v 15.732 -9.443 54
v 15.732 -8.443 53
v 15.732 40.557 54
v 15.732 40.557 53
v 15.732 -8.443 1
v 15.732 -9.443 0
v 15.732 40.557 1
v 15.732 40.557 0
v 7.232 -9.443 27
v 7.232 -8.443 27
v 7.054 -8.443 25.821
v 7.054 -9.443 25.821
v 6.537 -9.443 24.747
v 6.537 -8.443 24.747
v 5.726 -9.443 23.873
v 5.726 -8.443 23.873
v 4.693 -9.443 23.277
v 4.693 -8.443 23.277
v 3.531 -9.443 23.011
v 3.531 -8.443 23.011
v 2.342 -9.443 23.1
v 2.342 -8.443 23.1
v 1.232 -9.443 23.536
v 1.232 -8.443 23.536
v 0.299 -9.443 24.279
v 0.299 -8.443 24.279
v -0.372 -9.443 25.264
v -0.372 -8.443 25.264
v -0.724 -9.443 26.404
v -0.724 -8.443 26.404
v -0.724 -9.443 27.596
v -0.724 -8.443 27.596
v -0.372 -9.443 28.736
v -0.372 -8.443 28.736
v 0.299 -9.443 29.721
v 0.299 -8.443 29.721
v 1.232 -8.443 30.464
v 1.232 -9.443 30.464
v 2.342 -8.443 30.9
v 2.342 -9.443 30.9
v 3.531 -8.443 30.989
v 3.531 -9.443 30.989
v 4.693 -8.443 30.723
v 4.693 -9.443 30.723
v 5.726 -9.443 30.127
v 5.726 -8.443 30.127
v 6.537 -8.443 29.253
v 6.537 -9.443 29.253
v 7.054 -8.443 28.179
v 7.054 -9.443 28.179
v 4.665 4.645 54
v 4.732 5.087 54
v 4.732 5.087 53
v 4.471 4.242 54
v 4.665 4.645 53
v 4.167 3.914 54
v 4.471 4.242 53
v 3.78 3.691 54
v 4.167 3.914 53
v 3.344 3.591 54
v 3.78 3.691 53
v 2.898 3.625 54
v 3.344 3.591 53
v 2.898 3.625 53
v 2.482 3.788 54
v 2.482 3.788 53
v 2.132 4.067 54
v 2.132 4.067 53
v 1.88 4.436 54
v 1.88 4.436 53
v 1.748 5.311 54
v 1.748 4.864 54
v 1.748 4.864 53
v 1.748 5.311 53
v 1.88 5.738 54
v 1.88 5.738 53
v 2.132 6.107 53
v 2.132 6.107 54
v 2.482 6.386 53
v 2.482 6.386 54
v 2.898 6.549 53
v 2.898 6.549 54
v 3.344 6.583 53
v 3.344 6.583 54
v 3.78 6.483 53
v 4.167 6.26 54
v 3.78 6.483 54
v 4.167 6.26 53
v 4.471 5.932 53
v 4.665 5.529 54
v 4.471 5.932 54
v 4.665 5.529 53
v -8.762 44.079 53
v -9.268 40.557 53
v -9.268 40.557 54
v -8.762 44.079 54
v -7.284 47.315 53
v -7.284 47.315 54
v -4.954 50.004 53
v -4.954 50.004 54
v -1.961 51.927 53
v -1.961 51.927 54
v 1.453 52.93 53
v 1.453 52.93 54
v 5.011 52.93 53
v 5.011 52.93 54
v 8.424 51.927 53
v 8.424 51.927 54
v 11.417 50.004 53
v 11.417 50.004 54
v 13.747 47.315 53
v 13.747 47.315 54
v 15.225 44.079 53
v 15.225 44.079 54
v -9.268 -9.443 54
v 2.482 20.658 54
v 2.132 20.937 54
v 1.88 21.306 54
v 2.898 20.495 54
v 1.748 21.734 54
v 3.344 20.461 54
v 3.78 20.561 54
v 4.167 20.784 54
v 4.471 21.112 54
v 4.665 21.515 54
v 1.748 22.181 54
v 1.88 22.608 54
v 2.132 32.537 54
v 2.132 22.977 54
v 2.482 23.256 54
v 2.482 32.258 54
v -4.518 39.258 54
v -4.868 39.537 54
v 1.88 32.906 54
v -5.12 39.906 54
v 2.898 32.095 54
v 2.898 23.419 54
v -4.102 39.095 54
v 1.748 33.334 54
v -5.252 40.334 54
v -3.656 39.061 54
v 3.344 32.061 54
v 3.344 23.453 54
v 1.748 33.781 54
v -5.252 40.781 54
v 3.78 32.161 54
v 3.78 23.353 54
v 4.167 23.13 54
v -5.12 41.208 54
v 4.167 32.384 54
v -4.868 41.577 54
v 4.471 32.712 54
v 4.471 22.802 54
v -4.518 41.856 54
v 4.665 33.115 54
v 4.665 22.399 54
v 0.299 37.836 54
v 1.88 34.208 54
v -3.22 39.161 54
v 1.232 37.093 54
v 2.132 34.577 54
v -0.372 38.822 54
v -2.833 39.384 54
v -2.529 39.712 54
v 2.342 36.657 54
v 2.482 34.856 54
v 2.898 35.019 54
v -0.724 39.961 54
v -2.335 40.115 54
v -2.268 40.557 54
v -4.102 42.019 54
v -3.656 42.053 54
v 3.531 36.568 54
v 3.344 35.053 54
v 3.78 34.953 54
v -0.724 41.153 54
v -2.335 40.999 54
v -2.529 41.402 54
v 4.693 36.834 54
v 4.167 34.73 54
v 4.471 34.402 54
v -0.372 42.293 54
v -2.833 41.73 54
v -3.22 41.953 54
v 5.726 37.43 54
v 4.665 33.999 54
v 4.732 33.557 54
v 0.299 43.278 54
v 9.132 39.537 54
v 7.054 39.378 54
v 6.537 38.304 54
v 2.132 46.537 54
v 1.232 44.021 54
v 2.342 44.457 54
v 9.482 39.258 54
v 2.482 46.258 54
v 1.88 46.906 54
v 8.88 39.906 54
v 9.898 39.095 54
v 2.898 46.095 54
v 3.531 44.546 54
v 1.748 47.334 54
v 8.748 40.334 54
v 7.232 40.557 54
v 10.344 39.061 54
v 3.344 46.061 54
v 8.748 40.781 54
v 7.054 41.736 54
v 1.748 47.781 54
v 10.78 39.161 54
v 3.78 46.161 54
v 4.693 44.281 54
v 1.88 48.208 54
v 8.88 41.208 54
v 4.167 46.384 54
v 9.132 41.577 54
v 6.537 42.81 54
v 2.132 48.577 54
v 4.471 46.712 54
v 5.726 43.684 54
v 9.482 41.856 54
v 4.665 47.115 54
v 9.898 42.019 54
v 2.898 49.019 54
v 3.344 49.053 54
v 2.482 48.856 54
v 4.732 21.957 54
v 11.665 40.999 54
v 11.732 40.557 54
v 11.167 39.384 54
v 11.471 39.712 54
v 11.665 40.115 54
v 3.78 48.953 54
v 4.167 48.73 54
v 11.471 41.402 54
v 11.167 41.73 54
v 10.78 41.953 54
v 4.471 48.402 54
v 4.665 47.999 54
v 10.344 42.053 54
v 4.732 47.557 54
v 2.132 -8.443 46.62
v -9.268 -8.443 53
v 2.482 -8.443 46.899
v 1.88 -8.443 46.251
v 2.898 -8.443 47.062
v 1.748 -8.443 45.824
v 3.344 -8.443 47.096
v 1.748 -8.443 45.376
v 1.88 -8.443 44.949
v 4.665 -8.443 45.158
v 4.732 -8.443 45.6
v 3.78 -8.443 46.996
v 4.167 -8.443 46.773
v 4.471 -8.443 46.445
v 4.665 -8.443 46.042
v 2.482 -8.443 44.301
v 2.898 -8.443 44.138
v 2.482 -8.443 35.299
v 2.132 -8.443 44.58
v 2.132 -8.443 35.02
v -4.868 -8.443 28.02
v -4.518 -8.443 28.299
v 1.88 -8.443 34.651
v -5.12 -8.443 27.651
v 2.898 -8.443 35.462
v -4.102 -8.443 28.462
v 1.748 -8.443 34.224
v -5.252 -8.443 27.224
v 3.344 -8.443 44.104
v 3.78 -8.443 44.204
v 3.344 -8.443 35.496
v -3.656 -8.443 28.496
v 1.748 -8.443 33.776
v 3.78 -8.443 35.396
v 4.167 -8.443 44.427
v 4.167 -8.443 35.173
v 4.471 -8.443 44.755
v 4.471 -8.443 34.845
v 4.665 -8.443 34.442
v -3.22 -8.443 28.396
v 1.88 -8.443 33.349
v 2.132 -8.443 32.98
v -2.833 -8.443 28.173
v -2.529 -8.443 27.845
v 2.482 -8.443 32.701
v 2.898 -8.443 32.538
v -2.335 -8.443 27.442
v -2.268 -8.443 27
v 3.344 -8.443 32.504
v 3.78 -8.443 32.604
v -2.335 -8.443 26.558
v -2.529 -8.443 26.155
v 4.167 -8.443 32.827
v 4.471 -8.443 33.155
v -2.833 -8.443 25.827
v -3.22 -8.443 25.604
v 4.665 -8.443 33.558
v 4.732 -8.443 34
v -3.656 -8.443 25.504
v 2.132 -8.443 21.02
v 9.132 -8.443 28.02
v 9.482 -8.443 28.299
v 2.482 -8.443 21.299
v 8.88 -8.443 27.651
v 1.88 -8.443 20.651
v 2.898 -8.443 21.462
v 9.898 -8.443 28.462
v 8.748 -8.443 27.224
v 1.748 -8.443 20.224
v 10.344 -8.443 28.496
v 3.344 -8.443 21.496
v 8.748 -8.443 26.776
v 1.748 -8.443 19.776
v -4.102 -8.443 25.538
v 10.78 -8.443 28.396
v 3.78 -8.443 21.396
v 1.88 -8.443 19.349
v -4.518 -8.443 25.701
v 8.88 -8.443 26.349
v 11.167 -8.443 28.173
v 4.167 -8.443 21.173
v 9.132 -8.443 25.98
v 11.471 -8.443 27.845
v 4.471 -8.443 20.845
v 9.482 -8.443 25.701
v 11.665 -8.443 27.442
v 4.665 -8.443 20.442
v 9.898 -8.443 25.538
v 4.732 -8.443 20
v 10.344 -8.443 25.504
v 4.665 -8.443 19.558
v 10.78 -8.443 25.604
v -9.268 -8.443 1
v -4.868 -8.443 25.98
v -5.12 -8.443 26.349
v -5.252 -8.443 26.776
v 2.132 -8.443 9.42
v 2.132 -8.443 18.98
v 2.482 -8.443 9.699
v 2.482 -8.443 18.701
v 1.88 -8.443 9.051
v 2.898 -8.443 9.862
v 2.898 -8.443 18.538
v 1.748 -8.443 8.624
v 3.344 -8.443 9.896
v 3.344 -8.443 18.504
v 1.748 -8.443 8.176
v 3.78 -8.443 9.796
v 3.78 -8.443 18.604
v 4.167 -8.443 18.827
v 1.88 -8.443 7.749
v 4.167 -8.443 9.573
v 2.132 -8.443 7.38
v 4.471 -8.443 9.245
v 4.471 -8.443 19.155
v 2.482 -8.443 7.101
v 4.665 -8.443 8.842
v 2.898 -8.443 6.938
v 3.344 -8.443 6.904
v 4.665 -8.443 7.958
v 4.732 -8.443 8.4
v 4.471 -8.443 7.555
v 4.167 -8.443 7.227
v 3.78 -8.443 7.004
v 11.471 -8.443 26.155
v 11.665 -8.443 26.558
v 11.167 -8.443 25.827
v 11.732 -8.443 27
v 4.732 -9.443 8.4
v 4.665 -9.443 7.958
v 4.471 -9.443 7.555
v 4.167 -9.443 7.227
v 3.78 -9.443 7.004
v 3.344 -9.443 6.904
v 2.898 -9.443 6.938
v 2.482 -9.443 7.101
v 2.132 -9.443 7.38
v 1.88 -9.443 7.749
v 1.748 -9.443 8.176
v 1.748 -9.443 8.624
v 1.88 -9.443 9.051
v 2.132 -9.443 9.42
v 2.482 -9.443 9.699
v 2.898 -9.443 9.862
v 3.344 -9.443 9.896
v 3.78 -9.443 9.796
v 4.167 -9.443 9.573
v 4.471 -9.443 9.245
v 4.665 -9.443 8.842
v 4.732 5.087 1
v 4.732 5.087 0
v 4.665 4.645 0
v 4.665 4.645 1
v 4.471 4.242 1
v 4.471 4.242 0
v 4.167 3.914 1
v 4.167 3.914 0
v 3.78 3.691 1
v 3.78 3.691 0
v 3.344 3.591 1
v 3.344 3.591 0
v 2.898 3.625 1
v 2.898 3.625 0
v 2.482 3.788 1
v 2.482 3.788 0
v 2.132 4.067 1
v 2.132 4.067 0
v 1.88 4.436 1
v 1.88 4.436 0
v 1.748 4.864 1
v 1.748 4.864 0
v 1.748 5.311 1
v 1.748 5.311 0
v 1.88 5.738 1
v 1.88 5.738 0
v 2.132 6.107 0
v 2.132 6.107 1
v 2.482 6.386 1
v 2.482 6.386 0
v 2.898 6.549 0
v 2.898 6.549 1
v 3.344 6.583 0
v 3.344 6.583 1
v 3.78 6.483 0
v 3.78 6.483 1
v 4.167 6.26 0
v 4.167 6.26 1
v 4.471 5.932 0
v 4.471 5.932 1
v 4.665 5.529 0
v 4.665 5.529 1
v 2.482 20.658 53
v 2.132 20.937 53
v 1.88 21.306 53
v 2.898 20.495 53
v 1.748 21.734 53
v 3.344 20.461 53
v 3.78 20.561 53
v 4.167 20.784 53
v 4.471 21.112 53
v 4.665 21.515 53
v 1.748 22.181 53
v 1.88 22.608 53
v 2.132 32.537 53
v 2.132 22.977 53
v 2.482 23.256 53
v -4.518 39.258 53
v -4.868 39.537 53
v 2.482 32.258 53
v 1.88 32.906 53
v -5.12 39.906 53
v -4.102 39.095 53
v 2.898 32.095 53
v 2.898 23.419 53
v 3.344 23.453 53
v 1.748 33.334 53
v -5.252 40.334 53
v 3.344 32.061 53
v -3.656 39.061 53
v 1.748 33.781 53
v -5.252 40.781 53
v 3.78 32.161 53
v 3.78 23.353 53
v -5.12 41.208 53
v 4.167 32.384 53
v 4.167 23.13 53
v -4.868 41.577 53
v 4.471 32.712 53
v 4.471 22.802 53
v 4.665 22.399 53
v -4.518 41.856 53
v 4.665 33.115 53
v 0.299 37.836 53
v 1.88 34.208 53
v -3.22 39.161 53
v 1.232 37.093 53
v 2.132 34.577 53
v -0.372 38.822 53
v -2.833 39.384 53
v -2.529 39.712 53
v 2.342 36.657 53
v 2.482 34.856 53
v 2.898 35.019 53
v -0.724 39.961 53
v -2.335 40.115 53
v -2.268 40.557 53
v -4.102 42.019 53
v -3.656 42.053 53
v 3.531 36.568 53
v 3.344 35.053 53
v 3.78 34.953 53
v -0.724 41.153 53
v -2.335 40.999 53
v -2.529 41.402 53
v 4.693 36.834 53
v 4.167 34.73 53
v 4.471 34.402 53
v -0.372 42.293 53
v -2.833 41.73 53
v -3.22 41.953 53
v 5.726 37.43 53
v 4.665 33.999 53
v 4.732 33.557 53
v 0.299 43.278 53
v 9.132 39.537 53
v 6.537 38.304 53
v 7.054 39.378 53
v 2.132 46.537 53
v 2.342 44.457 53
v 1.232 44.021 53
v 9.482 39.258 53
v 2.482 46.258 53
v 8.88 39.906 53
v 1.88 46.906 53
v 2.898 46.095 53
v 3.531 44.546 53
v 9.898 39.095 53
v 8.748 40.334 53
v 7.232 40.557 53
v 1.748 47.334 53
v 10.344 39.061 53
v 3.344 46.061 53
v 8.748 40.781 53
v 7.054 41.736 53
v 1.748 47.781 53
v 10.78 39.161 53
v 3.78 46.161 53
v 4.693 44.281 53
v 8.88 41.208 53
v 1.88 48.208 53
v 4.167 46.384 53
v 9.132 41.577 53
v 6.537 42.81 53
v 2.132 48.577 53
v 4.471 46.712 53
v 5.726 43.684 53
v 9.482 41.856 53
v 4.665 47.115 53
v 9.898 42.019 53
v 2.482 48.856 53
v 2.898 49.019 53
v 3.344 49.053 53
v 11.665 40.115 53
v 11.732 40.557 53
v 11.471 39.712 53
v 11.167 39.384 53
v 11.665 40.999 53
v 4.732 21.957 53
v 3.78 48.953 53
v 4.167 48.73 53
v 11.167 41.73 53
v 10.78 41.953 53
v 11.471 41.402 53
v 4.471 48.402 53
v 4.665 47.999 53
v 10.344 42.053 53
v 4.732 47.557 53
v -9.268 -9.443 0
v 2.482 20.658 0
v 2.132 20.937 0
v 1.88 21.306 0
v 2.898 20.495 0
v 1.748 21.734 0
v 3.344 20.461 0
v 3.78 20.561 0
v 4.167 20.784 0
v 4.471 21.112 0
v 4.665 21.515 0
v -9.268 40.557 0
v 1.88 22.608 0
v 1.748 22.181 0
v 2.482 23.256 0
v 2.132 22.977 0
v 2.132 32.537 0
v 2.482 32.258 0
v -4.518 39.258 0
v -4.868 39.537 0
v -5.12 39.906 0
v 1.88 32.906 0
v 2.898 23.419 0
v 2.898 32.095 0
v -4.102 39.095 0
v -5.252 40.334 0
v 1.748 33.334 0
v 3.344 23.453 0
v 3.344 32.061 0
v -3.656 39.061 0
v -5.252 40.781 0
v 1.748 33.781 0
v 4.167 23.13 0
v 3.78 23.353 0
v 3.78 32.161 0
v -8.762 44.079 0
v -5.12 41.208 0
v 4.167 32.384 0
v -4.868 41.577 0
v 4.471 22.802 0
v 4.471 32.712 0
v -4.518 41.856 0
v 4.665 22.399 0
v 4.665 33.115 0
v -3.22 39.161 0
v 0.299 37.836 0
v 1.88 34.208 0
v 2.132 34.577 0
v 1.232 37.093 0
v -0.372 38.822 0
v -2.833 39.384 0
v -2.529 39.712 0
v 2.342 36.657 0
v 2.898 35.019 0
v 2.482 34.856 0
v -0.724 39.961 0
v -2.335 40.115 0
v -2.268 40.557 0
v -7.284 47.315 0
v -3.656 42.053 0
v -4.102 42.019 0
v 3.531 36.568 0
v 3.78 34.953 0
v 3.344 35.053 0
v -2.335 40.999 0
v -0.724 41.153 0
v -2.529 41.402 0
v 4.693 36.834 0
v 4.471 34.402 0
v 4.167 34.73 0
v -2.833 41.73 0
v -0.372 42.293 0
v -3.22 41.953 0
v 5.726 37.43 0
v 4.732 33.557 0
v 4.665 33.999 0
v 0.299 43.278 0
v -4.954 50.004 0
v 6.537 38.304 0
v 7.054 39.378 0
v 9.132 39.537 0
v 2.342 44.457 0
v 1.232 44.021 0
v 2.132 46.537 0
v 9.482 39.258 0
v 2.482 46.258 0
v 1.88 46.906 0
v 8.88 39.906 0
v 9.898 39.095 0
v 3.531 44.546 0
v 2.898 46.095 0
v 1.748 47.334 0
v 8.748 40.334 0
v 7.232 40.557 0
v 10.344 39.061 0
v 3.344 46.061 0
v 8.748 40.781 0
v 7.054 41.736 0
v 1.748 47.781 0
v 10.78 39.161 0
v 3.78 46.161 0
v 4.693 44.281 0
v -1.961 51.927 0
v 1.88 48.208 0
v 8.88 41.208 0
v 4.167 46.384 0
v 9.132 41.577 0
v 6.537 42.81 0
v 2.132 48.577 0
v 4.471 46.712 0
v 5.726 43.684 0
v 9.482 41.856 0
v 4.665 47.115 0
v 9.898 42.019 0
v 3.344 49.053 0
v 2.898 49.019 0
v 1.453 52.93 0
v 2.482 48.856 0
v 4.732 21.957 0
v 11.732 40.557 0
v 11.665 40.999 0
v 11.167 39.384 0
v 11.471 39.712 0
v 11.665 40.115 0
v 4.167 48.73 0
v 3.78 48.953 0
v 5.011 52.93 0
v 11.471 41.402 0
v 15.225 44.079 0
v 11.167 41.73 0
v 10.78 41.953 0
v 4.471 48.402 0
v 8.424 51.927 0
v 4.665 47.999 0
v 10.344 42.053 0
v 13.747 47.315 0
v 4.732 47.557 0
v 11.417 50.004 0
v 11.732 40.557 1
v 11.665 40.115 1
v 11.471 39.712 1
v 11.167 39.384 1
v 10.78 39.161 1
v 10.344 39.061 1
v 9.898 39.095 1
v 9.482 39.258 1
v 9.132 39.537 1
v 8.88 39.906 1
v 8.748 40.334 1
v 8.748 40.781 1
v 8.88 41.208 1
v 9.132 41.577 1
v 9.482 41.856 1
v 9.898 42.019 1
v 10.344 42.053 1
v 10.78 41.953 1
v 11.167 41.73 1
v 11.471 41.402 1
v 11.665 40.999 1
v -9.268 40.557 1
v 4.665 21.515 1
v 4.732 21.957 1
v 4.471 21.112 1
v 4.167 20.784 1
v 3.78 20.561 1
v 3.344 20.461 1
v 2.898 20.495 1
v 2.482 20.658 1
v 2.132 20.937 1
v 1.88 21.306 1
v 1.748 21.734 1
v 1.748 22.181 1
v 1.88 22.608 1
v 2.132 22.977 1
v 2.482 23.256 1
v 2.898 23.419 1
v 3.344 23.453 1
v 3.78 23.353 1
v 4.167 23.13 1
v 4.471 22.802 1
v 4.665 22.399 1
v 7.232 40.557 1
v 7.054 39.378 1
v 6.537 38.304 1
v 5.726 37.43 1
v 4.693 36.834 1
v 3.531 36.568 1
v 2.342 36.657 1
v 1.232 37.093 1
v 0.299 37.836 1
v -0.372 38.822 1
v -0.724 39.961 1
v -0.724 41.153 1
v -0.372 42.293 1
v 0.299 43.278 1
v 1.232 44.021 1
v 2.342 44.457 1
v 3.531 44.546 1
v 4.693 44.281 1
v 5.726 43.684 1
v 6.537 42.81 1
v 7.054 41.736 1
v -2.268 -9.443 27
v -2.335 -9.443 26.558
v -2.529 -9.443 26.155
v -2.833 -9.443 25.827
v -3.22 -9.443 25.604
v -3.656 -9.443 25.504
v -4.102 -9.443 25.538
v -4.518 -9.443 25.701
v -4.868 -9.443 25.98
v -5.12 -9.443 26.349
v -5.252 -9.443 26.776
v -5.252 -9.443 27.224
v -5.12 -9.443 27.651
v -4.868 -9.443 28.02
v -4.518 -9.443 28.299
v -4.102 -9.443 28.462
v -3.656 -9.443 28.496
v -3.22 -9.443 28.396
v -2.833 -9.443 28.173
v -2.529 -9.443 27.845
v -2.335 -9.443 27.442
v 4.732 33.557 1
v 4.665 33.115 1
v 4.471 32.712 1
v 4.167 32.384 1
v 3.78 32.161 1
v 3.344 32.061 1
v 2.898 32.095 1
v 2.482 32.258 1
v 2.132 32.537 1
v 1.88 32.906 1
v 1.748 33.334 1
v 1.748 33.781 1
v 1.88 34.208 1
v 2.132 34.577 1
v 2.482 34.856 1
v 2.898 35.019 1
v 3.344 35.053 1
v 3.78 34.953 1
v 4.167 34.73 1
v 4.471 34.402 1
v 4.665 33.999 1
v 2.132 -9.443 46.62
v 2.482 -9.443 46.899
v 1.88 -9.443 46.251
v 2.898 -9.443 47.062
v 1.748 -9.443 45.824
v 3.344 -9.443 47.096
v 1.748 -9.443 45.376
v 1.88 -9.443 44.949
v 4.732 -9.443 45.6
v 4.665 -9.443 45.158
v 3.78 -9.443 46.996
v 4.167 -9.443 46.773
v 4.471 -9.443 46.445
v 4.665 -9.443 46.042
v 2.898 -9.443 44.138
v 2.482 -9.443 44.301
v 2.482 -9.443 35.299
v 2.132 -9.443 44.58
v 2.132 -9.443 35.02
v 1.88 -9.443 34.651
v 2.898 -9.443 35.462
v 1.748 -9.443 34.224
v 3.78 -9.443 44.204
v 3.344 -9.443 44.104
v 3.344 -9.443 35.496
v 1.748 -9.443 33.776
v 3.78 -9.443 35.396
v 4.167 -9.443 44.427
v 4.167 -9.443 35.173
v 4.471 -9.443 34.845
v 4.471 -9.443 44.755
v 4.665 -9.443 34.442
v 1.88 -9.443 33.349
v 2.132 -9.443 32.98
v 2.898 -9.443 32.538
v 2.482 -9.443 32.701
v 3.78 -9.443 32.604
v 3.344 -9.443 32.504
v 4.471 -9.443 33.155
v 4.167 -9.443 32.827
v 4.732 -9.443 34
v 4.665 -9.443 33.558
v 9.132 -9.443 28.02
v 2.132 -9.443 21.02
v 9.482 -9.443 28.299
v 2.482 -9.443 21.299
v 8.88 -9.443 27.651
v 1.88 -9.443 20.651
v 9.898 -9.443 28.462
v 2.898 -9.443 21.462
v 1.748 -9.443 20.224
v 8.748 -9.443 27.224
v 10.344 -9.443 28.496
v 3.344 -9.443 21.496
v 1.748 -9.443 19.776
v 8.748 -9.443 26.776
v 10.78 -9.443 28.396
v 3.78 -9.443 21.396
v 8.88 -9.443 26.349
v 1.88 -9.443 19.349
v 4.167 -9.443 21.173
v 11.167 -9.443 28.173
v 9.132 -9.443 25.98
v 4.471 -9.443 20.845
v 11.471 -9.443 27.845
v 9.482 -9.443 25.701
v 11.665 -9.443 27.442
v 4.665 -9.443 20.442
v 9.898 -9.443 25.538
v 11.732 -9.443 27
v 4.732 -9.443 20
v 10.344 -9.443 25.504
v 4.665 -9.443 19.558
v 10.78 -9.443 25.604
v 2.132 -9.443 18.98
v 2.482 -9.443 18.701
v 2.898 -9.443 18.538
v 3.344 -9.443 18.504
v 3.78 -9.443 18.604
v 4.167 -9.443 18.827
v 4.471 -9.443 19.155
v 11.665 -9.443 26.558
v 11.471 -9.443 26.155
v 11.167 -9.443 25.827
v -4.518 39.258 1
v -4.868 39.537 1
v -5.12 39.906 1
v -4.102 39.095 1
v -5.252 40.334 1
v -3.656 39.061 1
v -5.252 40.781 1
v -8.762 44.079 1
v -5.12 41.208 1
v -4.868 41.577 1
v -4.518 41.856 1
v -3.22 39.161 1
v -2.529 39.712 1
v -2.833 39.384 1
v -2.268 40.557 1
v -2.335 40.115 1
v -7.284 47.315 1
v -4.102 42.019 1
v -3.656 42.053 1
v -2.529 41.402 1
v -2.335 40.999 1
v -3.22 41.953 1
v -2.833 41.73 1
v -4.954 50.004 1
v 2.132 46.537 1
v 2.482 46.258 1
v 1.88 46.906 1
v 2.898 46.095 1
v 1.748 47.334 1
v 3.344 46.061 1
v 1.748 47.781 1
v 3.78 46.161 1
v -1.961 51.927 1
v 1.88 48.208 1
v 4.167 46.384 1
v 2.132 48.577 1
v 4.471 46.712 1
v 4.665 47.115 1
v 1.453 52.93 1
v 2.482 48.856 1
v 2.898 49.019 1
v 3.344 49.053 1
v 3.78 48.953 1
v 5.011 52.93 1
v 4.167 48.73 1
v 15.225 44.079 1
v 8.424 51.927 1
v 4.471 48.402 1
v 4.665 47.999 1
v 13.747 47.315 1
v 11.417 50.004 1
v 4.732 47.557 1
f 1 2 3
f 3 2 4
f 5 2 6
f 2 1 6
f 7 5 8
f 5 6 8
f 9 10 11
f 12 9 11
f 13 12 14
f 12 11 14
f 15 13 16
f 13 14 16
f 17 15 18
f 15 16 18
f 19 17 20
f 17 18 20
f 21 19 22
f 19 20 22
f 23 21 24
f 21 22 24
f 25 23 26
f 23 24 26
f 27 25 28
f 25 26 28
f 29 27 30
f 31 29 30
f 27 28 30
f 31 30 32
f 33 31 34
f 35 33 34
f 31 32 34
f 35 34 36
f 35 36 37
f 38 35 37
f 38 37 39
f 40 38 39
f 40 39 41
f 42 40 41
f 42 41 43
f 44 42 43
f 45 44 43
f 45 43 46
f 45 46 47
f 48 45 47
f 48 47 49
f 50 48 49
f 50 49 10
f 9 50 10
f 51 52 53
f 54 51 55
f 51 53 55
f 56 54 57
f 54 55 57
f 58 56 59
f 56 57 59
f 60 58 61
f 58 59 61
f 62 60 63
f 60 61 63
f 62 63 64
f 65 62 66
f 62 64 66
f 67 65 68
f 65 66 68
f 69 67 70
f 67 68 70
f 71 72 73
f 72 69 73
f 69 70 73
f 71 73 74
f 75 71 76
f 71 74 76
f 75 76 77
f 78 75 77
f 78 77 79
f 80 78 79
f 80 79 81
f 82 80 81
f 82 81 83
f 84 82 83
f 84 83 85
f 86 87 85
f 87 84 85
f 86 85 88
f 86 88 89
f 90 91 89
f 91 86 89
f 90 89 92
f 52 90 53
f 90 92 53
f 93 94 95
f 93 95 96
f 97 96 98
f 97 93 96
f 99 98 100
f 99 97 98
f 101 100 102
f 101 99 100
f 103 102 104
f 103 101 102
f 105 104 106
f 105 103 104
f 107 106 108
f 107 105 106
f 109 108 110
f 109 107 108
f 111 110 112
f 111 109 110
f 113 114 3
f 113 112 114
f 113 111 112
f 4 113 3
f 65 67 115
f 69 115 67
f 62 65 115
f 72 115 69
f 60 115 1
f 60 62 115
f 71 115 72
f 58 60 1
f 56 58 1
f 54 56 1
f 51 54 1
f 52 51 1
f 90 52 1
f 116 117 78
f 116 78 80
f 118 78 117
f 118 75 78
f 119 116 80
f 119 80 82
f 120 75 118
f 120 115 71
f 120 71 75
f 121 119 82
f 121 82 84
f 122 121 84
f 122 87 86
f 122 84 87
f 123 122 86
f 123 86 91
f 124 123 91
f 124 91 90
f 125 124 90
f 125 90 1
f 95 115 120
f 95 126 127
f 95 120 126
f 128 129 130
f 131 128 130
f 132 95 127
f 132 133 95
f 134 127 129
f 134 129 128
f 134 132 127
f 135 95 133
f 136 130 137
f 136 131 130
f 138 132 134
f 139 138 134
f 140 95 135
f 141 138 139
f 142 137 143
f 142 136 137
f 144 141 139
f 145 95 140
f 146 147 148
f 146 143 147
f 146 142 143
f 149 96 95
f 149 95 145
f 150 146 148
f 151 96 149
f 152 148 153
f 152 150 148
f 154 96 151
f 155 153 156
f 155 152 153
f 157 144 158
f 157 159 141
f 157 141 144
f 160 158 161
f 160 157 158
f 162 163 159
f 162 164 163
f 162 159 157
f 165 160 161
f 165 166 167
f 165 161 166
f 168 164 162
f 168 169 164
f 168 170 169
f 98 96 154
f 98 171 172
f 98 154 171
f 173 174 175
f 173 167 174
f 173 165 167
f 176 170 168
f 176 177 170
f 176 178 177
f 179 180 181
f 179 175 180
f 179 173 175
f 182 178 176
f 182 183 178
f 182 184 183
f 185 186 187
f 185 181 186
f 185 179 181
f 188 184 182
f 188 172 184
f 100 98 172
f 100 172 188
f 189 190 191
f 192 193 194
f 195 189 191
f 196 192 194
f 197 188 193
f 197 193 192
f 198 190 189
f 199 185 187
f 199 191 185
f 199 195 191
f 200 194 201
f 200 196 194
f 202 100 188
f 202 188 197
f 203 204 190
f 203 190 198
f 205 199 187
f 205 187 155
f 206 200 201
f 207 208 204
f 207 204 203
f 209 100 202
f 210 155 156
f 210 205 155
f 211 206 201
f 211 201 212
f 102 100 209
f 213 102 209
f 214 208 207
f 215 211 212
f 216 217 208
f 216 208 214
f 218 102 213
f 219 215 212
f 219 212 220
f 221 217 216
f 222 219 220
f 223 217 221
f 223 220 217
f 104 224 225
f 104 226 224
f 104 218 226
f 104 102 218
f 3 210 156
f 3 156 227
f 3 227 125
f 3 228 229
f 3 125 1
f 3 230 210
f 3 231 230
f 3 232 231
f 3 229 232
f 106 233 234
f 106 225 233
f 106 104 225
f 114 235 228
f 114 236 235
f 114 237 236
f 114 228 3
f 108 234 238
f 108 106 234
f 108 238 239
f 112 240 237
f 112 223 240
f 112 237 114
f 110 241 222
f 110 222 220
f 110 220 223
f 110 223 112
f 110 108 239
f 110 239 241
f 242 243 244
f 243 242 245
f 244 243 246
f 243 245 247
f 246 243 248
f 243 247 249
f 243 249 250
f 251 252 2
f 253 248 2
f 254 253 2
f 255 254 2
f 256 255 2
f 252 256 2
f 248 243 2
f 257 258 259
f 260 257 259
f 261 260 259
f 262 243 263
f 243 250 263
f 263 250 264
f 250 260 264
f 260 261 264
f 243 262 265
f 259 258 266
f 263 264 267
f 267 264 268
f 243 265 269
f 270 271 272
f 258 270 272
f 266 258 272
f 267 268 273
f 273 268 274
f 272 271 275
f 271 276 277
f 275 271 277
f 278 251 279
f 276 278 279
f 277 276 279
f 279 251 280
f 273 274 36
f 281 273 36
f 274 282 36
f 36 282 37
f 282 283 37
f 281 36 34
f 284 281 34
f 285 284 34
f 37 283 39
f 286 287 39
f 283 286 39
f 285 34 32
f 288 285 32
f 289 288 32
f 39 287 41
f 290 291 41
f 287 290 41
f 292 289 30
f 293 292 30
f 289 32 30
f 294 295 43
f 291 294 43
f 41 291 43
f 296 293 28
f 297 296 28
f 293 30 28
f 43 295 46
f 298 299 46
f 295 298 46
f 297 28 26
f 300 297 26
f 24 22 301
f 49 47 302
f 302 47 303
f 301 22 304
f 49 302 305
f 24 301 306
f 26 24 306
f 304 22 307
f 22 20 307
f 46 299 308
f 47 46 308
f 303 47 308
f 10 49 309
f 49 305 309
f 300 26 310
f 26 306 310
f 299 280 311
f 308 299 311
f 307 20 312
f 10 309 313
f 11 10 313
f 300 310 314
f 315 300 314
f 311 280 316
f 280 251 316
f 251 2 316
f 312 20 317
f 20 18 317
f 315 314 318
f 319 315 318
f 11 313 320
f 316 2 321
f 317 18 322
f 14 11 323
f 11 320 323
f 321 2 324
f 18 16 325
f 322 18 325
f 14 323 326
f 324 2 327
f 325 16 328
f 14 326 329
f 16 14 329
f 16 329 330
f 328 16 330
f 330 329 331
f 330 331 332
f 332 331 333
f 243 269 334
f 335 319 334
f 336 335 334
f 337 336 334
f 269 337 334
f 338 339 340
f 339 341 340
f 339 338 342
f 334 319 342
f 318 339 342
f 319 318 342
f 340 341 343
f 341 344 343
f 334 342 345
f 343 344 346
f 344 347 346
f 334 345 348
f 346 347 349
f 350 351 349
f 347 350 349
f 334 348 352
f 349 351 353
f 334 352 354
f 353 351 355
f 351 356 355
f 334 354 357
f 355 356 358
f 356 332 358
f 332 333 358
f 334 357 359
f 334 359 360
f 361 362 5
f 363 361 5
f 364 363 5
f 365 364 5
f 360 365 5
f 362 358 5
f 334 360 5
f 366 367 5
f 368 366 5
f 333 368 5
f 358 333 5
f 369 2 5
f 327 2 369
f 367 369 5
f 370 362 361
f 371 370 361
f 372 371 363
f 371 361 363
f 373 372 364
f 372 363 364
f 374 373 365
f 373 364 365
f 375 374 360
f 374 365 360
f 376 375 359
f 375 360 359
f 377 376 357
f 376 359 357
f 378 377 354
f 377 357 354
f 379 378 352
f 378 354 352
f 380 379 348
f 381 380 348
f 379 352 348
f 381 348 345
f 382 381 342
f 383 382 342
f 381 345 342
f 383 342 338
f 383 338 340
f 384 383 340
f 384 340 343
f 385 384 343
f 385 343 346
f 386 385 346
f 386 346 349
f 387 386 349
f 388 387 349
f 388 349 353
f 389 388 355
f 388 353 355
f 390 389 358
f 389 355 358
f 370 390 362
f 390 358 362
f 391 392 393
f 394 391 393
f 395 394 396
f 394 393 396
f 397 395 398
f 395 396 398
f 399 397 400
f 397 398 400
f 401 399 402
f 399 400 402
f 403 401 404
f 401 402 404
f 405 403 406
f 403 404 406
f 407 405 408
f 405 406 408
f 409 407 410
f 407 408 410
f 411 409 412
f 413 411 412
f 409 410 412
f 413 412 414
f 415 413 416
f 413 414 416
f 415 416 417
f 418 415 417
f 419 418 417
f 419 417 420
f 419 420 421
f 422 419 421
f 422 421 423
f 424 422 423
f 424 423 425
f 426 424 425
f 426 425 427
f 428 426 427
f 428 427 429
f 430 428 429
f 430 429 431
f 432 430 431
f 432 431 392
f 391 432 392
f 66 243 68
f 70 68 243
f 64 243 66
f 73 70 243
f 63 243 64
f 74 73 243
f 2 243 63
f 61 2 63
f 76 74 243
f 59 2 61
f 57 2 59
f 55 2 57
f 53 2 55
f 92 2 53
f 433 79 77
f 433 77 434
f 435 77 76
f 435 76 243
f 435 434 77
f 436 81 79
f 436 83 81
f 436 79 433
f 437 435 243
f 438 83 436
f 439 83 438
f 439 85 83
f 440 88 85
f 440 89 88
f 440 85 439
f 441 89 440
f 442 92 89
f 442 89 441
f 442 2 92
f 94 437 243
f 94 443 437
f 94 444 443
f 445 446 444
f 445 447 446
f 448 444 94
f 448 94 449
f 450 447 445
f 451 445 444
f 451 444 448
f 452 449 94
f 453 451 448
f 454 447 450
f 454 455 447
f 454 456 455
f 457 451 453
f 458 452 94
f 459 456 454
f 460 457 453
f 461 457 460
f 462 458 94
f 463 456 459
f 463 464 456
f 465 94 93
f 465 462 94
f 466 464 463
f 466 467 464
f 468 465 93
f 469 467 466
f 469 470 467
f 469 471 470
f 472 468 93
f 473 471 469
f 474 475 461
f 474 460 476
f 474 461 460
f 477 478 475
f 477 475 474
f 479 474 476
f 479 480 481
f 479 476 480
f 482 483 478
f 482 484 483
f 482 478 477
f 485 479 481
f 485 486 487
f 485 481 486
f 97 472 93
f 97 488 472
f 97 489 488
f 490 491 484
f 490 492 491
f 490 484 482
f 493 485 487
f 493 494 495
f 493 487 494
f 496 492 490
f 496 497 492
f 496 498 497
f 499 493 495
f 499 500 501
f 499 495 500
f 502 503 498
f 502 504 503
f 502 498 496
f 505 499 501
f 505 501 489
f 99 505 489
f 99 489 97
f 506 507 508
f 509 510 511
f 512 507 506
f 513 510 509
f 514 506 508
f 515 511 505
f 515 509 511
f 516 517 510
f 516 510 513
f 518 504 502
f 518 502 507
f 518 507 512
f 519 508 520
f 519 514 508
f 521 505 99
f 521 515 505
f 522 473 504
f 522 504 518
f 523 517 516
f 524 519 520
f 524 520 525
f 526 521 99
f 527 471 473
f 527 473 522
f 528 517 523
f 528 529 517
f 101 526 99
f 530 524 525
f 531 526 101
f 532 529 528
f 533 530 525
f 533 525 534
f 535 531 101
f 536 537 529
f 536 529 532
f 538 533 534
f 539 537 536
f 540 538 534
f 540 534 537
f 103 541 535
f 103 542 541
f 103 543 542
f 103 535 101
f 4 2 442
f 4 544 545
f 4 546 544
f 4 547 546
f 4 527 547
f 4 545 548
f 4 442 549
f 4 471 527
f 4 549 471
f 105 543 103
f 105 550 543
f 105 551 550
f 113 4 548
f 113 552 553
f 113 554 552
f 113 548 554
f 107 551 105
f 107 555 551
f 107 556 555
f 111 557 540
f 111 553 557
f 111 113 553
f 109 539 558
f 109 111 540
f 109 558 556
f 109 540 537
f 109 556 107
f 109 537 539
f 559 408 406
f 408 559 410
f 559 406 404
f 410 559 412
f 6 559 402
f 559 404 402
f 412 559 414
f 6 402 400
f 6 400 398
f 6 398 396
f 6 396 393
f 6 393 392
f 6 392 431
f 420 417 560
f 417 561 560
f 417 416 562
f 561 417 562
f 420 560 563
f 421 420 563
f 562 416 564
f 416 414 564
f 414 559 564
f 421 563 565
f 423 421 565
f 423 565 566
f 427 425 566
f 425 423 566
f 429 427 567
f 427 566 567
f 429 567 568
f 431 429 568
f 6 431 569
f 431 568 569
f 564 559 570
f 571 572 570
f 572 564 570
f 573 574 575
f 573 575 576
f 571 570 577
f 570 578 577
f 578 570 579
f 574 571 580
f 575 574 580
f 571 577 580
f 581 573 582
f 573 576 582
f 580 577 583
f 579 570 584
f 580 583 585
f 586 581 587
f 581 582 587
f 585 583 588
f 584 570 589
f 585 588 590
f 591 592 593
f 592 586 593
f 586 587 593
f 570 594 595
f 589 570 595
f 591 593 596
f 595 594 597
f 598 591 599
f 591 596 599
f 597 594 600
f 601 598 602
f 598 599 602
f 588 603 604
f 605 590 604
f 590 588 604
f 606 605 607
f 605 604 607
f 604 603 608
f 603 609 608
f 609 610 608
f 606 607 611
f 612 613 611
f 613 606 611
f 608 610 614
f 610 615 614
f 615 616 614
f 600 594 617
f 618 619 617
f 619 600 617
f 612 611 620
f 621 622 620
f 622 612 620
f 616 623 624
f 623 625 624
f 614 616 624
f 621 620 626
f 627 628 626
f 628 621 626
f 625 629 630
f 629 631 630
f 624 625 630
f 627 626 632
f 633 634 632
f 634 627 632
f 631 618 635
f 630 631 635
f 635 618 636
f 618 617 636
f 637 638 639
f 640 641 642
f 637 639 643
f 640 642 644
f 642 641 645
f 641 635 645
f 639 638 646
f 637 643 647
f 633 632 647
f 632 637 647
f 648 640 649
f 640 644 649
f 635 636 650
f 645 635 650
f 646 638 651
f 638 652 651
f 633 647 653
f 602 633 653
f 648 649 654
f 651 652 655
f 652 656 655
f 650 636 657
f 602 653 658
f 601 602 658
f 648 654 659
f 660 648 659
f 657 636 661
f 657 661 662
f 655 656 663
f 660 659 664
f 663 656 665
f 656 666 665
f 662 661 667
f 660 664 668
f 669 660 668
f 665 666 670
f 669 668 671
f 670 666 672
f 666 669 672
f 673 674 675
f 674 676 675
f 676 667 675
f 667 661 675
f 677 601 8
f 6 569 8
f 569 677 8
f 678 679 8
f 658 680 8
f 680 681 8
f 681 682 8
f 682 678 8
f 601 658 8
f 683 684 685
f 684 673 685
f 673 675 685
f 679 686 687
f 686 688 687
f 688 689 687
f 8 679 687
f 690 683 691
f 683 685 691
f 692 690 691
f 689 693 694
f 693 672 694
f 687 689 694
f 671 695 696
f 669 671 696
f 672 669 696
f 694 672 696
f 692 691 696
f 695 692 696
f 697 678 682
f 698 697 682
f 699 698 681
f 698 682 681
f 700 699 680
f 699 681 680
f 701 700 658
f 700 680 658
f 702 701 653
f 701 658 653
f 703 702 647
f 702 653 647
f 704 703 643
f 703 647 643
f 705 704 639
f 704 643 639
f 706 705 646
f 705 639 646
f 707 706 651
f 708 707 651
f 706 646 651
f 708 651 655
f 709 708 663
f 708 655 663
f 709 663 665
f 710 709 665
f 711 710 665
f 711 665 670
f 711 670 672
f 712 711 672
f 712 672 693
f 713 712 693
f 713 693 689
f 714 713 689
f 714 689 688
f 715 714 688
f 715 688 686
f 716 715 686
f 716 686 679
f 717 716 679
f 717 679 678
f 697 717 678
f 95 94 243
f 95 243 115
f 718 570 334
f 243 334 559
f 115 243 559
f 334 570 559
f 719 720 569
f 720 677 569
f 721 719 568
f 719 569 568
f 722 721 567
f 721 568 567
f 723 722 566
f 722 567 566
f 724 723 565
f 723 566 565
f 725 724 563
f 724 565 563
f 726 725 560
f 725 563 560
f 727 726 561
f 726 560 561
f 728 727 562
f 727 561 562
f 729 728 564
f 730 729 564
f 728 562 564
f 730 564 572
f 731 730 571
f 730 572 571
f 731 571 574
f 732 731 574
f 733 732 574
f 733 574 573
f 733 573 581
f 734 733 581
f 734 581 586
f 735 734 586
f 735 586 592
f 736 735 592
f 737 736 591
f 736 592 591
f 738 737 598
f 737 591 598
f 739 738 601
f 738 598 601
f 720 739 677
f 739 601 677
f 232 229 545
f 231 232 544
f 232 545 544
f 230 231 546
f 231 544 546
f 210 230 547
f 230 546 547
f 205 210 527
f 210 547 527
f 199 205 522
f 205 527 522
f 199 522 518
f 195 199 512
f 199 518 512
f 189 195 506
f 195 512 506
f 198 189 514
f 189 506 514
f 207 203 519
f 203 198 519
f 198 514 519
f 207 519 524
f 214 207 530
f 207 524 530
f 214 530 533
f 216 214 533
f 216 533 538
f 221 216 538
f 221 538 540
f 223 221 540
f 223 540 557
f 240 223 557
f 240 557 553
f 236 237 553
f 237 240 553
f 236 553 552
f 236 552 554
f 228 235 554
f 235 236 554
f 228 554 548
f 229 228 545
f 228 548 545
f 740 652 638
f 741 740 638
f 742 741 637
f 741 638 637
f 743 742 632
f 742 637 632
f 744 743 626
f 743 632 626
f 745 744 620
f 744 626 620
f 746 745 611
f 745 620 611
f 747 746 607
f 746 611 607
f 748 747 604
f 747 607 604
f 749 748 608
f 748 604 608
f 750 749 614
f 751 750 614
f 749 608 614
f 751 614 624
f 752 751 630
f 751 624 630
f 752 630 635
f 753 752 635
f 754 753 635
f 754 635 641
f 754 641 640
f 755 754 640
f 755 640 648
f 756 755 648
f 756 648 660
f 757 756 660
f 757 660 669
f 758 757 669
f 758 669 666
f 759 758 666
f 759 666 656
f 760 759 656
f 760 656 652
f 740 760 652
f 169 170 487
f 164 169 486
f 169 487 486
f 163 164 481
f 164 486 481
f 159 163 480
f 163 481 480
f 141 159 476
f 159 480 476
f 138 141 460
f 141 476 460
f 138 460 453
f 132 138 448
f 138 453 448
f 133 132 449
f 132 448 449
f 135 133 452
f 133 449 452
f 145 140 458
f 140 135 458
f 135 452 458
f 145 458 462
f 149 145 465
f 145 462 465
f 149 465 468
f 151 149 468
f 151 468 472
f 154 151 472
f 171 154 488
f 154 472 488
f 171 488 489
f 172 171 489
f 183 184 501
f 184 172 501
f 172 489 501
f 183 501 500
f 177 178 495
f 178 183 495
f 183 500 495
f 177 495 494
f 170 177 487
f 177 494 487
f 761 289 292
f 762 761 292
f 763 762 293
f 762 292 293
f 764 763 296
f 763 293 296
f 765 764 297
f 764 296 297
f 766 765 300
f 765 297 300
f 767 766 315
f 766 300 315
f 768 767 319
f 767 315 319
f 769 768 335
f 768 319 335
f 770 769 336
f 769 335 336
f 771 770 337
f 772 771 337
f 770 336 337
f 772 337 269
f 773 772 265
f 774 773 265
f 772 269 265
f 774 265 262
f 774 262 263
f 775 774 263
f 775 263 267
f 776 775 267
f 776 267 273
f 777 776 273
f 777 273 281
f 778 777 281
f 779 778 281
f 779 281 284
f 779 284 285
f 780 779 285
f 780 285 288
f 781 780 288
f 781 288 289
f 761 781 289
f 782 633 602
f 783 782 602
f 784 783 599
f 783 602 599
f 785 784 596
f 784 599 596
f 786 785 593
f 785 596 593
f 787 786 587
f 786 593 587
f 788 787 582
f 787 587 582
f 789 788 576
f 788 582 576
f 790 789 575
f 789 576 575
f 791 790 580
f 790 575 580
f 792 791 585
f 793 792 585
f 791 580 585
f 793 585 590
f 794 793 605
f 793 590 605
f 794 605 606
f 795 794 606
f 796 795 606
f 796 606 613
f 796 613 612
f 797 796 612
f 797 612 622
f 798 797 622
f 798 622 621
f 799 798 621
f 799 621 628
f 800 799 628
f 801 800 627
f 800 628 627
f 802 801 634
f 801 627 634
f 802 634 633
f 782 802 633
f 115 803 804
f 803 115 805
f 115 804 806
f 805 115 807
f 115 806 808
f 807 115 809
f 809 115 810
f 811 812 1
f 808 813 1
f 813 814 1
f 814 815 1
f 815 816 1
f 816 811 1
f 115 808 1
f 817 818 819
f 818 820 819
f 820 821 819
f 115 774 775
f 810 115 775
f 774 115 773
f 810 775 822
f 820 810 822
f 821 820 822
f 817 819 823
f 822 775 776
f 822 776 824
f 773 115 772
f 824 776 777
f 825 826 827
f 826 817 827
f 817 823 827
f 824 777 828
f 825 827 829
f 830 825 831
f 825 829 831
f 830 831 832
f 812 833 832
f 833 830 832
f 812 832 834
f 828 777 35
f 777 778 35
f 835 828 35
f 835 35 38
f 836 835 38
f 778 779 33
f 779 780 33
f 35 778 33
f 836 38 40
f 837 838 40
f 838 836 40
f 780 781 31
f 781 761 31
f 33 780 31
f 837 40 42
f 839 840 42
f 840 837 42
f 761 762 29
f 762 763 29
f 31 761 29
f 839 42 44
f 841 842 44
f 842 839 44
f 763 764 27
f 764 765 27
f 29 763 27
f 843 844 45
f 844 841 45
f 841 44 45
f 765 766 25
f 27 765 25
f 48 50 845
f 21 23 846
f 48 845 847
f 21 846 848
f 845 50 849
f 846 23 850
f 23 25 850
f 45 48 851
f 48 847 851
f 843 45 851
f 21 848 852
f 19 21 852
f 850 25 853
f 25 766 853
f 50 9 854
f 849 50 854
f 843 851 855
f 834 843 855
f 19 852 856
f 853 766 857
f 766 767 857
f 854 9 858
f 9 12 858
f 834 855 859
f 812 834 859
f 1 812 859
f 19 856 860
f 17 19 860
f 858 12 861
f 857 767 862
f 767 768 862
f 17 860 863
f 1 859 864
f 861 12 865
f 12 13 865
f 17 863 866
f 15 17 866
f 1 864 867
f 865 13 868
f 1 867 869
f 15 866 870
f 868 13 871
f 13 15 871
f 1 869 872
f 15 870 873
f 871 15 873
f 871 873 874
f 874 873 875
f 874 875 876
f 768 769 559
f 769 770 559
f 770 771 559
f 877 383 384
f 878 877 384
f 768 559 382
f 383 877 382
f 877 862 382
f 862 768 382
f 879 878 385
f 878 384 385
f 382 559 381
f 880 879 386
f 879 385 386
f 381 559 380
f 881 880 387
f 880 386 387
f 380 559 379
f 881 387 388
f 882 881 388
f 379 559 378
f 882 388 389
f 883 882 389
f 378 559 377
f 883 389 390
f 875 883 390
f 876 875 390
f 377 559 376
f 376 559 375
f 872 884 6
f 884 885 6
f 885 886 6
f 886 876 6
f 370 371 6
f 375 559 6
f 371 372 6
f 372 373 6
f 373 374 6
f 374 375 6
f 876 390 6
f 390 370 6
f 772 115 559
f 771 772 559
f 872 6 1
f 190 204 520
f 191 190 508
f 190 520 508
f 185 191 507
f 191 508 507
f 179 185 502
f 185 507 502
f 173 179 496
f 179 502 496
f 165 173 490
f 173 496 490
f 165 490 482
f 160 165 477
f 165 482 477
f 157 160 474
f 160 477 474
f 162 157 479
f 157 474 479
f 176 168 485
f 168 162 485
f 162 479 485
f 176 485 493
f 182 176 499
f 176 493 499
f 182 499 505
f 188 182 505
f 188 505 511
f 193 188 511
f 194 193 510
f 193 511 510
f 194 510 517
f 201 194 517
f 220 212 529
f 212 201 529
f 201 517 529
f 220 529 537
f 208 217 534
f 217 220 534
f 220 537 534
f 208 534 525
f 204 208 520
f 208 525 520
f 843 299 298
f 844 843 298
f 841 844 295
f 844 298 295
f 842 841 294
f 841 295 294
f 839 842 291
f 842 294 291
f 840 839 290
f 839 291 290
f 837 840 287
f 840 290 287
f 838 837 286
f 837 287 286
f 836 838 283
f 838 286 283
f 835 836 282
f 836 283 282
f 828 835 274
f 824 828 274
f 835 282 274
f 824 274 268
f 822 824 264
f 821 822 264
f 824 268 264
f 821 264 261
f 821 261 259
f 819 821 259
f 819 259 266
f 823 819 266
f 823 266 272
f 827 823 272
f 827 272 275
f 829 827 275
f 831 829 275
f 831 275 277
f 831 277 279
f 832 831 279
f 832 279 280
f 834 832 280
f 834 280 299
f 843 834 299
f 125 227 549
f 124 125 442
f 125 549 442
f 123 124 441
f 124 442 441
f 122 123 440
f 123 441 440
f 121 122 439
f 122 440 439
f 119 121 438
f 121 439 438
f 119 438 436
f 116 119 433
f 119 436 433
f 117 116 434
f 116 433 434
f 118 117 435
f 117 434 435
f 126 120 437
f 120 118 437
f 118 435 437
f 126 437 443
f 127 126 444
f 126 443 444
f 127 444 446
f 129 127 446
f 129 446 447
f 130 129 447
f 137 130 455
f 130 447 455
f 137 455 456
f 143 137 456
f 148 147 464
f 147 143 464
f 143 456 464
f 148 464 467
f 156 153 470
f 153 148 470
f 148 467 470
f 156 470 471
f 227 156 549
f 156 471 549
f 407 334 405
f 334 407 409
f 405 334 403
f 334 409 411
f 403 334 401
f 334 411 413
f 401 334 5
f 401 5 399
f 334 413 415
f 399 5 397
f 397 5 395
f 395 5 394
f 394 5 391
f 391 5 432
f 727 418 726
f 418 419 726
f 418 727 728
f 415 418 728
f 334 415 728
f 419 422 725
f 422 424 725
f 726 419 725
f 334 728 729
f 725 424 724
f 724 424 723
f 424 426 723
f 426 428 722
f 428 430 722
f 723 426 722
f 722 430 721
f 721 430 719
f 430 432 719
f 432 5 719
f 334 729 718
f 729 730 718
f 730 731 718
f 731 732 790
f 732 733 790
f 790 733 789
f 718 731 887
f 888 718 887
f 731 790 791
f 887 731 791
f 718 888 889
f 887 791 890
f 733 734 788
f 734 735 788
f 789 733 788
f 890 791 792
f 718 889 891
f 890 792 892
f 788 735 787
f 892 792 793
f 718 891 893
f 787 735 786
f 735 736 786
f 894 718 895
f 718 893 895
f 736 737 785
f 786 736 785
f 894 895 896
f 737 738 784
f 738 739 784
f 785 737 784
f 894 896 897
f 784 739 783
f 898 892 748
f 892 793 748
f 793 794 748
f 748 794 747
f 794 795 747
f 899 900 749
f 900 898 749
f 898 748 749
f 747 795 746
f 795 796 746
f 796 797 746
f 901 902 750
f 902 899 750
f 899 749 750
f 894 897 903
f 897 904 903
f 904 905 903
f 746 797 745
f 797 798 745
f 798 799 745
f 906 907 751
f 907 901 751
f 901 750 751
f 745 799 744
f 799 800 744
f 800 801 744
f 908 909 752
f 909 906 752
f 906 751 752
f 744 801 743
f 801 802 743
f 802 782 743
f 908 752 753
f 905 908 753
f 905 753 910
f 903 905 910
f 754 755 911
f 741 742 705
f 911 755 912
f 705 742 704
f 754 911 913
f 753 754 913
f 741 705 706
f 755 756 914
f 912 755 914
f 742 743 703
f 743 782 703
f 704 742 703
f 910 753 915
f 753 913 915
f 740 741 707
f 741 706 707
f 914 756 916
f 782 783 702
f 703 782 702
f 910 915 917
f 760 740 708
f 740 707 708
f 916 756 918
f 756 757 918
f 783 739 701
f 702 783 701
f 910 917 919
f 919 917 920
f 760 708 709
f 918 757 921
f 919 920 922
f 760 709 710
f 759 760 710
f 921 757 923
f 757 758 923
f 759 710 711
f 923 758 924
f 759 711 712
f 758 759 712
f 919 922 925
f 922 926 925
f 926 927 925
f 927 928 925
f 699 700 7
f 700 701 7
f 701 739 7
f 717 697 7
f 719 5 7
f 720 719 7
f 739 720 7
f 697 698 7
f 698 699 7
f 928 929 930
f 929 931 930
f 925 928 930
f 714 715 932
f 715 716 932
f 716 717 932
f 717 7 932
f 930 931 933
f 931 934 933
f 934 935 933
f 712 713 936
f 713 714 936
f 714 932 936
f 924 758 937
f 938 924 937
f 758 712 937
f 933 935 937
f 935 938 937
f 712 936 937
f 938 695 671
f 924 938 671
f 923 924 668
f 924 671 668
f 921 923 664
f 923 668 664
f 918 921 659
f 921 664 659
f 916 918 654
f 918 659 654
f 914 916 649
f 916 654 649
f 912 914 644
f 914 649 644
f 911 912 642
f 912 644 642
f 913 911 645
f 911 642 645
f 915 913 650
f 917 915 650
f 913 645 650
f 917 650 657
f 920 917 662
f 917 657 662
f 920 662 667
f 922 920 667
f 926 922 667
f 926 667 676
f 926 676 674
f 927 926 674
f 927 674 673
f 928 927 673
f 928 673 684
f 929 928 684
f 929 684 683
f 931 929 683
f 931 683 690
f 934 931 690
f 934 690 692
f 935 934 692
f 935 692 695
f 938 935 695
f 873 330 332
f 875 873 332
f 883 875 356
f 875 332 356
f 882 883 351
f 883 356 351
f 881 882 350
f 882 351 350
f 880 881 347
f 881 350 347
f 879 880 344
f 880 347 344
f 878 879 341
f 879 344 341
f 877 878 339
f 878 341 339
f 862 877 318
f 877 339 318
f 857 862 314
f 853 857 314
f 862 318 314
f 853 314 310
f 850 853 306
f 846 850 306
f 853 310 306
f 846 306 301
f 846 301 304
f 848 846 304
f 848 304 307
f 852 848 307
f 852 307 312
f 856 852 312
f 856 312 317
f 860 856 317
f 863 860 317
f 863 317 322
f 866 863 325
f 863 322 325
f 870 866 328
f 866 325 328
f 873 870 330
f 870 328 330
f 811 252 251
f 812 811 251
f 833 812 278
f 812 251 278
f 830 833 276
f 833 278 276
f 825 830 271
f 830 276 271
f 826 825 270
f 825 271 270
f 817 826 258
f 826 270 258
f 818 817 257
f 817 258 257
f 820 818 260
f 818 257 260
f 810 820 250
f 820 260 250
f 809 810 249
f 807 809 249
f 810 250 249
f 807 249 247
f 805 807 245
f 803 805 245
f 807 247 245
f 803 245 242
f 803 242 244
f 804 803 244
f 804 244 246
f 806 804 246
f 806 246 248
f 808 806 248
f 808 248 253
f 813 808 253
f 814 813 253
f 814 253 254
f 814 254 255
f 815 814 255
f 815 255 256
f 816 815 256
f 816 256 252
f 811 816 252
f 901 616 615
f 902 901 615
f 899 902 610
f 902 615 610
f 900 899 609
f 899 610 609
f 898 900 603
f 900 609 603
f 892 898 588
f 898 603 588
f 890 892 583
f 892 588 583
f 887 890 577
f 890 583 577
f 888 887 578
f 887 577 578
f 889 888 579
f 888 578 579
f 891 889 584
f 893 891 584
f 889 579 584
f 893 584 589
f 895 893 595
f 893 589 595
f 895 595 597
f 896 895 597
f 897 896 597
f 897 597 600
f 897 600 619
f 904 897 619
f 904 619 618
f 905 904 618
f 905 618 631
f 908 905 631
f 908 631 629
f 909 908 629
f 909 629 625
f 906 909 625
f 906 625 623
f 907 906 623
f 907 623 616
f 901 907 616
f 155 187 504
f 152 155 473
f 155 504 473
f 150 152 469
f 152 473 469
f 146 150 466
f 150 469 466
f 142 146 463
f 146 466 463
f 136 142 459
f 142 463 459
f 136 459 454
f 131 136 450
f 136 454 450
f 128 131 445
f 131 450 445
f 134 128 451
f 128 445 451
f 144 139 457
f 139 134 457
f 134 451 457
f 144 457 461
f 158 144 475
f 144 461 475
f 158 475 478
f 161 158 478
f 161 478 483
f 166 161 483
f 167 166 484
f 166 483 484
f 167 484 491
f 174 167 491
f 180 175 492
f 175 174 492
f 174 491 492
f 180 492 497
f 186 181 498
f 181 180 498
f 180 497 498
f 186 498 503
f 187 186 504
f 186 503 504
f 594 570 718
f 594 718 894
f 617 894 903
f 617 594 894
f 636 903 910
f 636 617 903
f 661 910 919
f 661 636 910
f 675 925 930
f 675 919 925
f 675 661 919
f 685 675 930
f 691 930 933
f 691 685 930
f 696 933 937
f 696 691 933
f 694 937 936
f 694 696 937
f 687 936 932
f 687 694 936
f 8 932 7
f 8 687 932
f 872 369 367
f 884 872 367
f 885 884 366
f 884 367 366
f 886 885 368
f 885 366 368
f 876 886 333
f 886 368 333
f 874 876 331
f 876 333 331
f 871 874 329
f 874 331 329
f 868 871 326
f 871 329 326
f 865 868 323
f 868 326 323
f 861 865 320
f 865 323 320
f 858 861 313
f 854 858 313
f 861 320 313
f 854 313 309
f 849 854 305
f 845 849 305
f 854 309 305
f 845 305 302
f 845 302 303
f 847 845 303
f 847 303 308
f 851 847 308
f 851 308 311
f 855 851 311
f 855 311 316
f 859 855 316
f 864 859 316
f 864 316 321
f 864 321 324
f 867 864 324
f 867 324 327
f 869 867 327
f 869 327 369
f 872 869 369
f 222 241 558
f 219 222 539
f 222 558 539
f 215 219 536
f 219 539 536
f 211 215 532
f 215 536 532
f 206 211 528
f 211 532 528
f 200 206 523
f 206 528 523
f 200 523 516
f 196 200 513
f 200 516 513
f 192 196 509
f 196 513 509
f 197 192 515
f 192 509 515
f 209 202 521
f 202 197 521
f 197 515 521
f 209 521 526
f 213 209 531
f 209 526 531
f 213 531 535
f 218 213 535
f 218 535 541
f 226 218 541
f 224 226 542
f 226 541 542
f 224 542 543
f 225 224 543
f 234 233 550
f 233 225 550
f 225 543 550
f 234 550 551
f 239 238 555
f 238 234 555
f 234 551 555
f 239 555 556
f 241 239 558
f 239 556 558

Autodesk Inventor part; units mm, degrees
ref_plane "YZ Plane" through (0, 0, 0) normal (1, 0, 0) x (0, 1, 0)
ref_plane "XZ Plane" through (0, 0, 0) normal (0, 1, 0) x (-1, 0, 0)
ref_plane "XY Plane" through (0, 0, 0) normal (0, 0, 1) x (1, 0, 0)
sketch "Sketch1" plane through (0, 0, 0) normal (0, 0, 1) x (1, 0, 0)
  line L0 (-9.2684, -9.4429) -> (15.7316, -9.4429)
  line L1 (15.7316, -9.4429) -> (15.7316, 40.5571)
  arc A0 (15.7316, 40.5571) -> (-9.2684, 40.5571) centre (3.2316, 40.5571) ccw
  line L2 (-9.2684, 40.5571) -> (-9.2684, -9.4429)
  circle A1 centre (3.2316, 40.5571) radius 4
  circle A2 centre (-3.7684, 40.5571) radius 1.5
  circle A3 centre (3.2316, 47.5571) radius 1.5
  circle A4 centre (3.2316, 33.5571) radius 1.5
  circle A5 centre (10.2316, 40.5571) radius 1.5
  circle A6 centre (3.2316, 21.9571) radius 1.5
  circle A7 centre (3.2316, 5.0871) radius 1.5
  point P0 (0, 0)
  dimension "d0" = 25
  dimension "d1" = 50
  dimension "d3" = 8
  dimension "d5" = 3
  dimension "d6" = 3
  dimension "d7" = 3
  dimension "d8" = 3
  dimension "d10" = 3
  dimension "d12" = 3
extrude "Extrusion1" add sketch "Sketch1" along normal blind 54
sketch "Sketch2" plane through (15.7316, -9.4429, 0) normal (1, 0, 0) x (0, 0, -1)
  line L0 (-54, 0) -> (-54, 50) projected
  line L1 (-54, 0) -> (-53, 0)
  line L2 (-53, 0) -> (-53, 1)
  line L3 (-53, 1) -> (-54, 1)
  line L4 (-54, 1) -> (-54, 0)
  line L5 (0, 0) -> (-1, 0)
  line L6 (-1, 0) -> (-1, 1)
  line L7 (-1, 1) -> (0, 1)
  line L8 (0, 1) -> (0, 0)
  line L9 (-53, 1) -> (-53, 62.5)
  line L10 (-53, 1) -> (-1, 1)
  line L11 (-1, 1) -> (-1, 62.5)
  line L12 (0, 50) -> (0, 50) projected
  line L13 (0, 50) -> (-54, 50) projected
  line L14 (-54, 50) -> (-54, 50) projected
  line L15 (0, 50) -> (-54, 50) projected
  line L16 (0, 62.5) -> (-54, 62.5) projected
  line L17 (-54, 62.5) -> (-54, 50) projected
  line L18 (0, 62.5) -> (0, 50) projected
  line L19 (0, 62.5) -> (-1, 62.5)
  line L20 (-1, 62.5) -> (-1, 0)
  line L21 (-1, 0) -> (0, 0)
  line L22 (0, 0) -> (0, 62.5)
  line L23 (-54, 62.5) -> (-53, 62.5)
  line L24 (-53, 62.5) -> (-53, 0)
  line L25 (-53, 0) -> (-54, 0)
  line L26 (-54, 0) -> (-54, 62.5)
  line L27 (-53, 62.5) -> (-1, 62.5)
  line L28 (-1, 62.5) -> (-1, 1)
  line L29 (-1, 1) -> (-53, 1)
  line L30 (-53, 1) -> (-53, 62.5)
  point P0 (0, 9.4429)
  dimension "d15" = 1
  dimension "d16" = 1
  dimension "d17" = 1
  dimension "d18" = 1
extrude "Extrusion2" cut sketch "Sketch2" against normal through all contours L9 L13 L11 L10 | L9 L16 L11 L13
sketch "Sketch3" plane through (15.7316, -8.4429, 53) normal (0, 1, 0) x (1, 0, 0)
  circle A0 centre (-12.5, 26) radius 4
  circle A1 centre (-12.5, 33) radius 1.5
  circle A2 centre (-19.5, 26) radius 1.5
  circle A3 centre (-12.5, 19) radius 1.5
  circle A4 centre (-5.5, 26) radius 1.5
  circle A5 centre (-12.5, 44.6) radius 1.5
  circle A6 centre (-12.5, 7.4) radius 1.5
  point P0 (-15.7316, 53)
  dimension "d23" = 3
  dimension "d26" = 360
  dimension "d29" = 3
extrude "Extrusion3" cut sketch "Sketch3" against normal blind 58
properties part number "modelo 1"
